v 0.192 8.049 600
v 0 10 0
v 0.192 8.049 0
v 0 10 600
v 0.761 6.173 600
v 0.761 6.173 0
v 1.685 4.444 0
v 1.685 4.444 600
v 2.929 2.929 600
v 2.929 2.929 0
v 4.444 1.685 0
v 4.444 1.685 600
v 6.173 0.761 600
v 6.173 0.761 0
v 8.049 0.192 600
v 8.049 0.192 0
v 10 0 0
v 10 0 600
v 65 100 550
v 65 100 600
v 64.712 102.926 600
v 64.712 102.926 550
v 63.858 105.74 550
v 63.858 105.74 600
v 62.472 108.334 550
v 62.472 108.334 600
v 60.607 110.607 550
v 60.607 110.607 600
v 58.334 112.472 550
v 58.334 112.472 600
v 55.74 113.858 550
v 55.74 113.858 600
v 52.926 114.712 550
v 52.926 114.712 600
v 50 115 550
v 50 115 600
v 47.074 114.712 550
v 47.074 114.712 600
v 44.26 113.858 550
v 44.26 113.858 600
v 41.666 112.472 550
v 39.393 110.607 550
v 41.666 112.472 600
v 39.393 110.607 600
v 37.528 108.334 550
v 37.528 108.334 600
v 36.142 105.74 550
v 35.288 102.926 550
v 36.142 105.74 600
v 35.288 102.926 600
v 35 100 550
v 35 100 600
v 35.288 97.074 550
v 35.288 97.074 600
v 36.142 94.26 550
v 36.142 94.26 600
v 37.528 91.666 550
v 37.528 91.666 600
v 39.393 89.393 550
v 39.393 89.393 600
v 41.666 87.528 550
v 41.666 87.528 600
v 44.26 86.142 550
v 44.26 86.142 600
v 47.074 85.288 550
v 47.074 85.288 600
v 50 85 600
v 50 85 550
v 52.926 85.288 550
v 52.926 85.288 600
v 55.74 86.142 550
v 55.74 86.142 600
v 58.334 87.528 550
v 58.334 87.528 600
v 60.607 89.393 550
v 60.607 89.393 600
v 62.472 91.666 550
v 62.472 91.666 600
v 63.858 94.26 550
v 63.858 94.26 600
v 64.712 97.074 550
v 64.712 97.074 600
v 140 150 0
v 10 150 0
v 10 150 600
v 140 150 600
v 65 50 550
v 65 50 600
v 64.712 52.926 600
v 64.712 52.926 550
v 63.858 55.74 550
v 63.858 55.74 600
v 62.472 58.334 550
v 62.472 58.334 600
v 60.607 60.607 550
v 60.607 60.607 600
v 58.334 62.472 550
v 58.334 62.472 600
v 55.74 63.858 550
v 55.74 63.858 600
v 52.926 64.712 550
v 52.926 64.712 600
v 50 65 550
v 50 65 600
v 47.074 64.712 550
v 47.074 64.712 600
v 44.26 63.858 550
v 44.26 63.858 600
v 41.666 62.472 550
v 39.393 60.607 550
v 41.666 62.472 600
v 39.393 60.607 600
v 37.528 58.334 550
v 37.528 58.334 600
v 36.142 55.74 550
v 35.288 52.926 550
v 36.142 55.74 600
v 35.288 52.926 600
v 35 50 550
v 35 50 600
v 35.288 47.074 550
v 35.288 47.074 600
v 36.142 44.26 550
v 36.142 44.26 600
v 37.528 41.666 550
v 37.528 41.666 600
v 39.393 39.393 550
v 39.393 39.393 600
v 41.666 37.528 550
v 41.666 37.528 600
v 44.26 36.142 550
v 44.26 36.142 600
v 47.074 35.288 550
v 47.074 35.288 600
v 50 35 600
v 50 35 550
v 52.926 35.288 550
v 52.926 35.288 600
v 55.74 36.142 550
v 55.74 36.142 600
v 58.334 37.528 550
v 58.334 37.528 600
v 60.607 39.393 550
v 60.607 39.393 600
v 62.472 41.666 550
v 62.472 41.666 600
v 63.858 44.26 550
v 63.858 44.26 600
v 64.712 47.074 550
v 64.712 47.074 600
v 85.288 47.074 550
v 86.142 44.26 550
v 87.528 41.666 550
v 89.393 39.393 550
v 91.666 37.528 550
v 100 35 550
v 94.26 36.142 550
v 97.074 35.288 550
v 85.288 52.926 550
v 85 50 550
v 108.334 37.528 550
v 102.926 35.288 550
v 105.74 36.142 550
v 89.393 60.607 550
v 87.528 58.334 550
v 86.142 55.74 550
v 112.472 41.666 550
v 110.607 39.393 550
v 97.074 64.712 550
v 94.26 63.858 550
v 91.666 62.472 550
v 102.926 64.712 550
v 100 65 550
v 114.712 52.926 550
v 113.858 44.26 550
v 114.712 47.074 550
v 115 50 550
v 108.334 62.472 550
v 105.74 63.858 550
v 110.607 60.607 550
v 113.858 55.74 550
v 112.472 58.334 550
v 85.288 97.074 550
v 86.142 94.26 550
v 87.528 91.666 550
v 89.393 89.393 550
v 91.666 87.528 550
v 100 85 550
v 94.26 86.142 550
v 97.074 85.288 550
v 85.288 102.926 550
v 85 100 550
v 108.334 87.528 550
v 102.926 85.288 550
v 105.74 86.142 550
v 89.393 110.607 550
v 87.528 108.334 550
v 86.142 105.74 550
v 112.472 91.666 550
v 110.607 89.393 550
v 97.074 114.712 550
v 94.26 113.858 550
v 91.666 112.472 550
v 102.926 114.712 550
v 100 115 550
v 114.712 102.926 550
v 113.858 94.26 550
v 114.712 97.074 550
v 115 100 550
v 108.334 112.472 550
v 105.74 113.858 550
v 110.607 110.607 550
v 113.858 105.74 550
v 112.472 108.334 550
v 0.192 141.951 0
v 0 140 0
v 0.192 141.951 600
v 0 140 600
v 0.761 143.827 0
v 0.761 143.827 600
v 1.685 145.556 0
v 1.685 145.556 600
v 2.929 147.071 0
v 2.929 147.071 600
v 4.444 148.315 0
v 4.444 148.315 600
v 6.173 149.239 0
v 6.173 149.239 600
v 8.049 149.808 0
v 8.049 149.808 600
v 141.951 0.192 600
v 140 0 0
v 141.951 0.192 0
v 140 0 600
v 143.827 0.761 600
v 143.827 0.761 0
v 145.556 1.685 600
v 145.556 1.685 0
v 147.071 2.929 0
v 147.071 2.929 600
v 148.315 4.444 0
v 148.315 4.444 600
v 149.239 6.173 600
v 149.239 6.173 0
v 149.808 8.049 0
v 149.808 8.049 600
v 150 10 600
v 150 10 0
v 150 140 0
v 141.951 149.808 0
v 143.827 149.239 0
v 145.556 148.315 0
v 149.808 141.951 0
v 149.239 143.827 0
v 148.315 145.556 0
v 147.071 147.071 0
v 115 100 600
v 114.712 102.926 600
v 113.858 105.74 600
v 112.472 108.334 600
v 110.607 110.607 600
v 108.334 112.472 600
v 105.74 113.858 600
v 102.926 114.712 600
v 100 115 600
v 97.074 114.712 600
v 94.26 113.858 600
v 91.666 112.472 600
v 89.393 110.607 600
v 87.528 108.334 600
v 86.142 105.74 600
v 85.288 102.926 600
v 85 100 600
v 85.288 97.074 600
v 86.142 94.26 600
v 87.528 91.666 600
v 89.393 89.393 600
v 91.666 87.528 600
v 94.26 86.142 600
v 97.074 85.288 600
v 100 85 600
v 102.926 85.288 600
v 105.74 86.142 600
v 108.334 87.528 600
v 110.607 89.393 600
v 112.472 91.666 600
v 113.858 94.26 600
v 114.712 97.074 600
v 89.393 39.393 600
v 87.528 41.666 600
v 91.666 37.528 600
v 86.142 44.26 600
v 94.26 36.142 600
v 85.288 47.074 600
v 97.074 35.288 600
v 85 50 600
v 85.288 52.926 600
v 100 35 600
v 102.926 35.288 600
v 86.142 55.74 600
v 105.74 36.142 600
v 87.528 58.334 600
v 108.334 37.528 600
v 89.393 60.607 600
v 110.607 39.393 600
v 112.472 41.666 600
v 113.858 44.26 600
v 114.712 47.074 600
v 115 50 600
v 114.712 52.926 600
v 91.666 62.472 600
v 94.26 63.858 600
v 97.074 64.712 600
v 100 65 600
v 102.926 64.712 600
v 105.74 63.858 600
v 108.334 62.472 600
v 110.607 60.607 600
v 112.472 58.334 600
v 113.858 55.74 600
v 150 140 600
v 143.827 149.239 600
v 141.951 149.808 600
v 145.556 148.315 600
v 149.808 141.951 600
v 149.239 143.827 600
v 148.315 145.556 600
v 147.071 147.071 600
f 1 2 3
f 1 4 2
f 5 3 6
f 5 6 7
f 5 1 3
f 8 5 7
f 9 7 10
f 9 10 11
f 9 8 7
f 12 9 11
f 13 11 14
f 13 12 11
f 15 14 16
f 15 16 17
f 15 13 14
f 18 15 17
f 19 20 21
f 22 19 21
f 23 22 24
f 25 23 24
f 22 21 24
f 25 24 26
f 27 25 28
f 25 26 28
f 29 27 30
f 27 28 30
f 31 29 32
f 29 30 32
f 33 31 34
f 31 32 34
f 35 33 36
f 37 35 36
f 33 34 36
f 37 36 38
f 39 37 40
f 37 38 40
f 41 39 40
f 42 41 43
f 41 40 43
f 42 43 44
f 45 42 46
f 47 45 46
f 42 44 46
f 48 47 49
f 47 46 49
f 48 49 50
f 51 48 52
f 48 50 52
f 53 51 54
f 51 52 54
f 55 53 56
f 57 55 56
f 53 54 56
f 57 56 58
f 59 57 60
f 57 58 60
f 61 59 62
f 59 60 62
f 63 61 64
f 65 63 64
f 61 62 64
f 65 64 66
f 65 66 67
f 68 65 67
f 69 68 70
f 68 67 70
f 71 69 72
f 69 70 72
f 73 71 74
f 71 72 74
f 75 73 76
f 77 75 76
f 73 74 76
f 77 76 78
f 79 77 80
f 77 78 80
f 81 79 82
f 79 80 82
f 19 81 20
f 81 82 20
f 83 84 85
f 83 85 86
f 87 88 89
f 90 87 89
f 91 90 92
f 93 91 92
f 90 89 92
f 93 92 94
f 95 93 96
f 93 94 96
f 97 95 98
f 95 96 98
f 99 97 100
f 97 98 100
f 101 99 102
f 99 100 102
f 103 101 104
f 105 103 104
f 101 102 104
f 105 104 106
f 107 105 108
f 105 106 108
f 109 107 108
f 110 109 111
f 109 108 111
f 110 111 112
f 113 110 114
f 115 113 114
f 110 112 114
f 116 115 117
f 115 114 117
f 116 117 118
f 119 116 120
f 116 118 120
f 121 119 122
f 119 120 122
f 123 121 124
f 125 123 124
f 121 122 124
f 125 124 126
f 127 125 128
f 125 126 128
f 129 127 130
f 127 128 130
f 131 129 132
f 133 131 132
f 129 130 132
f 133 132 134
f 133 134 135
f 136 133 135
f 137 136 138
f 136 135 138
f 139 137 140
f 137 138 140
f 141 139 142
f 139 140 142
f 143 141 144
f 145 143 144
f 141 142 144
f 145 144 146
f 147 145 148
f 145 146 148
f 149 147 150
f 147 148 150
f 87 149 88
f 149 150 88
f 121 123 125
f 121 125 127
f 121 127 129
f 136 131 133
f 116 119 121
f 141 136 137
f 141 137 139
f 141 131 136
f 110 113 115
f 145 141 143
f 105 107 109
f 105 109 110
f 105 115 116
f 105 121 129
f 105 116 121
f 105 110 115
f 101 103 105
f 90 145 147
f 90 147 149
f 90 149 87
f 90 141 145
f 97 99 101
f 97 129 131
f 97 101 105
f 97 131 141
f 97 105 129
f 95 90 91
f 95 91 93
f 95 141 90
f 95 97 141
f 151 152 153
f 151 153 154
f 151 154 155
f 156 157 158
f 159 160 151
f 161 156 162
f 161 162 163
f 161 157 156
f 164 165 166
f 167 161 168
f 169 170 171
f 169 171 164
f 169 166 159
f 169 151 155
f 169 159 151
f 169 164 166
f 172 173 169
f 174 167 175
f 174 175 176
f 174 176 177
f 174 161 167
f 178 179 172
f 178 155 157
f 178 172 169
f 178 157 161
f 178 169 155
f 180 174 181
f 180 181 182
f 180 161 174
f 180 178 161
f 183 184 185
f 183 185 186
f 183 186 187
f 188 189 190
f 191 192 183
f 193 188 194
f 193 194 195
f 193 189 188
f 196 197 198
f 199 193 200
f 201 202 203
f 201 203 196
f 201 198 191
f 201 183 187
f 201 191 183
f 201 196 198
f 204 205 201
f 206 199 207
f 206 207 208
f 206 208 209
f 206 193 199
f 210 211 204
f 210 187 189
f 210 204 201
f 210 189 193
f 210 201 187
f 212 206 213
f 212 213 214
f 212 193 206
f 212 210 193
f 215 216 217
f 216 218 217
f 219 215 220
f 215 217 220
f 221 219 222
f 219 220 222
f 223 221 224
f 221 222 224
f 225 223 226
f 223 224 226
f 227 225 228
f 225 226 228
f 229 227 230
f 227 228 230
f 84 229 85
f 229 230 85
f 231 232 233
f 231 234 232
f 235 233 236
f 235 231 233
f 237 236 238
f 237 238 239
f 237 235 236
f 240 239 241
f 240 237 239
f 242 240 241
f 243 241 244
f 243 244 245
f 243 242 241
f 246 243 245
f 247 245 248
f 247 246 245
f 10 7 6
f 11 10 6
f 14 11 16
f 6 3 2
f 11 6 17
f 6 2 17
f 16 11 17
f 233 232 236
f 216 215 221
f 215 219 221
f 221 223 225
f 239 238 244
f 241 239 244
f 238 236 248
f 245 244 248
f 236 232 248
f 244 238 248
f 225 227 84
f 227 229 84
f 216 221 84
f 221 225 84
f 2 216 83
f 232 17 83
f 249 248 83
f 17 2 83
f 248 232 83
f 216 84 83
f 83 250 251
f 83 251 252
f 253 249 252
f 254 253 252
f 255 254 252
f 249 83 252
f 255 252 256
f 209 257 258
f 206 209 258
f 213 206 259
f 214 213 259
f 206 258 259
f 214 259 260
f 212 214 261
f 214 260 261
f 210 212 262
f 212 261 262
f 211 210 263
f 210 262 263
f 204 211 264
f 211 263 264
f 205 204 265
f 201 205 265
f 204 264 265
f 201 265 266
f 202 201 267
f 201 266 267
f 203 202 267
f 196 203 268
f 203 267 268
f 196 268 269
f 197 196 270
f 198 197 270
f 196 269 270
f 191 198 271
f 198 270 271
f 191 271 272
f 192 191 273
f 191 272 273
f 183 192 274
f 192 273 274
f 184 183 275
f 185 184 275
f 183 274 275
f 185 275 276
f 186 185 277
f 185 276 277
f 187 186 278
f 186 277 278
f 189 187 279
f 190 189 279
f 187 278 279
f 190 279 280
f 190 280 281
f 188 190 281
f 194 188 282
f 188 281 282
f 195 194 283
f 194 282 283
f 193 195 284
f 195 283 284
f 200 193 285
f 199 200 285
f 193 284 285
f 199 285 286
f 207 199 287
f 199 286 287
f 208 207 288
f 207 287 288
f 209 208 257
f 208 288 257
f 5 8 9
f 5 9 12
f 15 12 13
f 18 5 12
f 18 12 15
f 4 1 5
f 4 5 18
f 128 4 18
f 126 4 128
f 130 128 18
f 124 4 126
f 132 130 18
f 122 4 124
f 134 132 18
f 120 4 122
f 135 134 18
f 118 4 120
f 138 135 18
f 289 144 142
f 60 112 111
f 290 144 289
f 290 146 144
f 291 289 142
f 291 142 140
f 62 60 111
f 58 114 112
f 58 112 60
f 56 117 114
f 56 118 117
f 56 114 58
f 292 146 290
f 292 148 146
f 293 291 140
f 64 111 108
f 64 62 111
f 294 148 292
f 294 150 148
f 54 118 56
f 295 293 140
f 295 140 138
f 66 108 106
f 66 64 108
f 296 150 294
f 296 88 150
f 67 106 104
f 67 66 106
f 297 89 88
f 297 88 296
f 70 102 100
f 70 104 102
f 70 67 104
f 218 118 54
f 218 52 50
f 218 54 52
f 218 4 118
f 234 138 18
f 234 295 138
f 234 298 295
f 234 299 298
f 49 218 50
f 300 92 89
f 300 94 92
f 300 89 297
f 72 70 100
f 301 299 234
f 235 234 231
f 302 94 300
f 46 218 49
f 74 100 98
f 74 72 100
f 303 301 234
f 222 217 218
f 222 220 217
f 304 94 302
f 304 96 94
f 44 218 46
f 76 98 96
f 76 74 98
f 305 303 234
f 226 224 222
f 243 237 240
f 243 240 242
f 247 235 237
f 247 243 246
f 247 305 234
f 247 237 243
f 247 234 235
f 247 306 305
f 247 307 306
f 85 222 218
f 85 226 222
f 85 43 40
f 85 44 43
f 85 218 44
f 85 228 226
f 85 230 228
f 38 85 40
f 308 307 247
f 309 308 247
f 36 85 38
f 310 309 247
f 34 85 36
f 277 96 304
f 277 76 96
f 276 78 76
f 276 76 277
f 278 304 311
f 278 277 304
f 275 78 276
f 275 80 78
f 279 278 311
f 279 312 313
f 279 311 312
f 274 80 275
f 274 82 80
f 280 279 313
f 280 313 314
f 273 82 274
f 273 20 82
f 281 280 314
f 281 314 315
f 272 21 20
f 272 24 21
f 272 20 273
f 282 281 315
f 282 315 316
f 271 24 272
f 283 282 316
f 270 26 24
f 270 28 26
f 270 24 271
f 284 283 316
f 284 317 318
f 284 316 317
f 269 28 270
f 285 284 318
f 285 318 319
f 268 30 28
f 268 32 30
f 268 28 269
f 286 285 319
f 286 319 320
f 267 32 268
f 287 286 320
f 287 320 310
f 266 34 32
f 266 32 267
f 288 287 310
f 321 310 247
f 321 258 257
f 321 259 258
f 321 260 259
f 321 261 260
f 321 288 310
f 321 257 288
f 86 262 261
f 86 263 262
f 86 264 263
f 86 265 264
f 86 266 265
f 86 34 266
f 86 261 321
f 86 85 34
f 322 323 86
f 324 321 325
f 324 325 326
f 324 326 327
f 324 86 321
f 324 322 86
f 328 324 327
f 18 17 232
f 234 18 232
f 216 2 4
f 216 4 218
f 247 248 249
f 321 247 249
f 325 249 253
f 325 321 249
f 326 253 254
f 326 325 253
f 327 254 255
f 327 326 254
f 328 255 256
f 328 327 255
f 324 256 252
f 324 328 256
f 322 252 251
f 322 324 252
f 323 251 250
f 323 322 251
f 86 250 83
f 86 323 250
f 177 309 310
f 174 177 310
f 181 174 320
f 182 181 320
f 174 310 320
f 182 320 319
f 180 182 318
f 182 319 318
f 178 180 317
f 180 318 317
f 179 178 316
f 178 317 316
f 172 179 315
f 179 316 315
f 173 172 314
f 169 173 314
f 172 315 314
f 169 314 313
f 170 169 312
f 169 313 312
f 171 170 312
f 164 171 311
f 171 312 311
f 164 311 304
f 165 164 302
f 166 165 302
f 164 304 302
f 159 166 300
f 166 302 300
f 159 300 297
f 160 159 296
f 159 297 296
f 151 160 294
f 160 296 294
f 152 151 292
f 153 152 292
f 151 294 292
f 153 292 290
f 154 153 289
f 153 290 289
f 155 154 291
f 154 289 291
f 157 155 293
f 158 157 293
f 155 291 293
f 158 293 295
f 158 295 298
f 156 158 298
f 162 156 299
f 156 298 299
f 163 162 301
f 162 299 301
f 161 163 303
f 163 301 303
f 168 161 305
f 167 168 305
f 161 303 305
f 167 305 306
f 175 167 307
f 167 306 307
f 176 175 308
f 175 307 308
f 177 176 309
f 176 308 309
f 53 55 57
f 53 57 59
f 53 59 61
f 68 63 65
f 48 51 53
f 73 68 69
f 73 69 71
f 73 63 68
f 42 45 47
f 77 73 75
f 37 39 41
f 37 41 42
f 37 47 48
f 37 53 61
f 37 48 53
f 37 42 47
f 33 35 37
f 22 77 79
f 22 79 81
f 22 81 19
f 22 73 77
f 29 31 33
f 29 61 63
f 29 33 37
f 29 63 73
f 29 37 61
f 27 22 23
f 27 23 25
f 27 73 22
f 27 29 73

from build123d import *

# Parameters (mm, degrees)
F0_W     = 150
F0_H     = 150
F1_DEPTH = 600
F2_R     = 10
F3_R     = 15
F4_DEPTH = 50


with BuildPart() as f1:
    # F0 (on Top) → F1 (new body)
    with BuildSketch(Plane.XY):
        with Locations((75, 75)):
            Rectangle(F0_W, F0_H)
    extrude(amount=F1_DEPTH)

    # F2
    f2_edges = [f1.edges().sort_by_distance(p)[0] for p in [
        (0, 150, 300),
        (150, 150, 300),
        (150, 0, 300),
        (0, 0, 300),
    ]]
    fillet(f2_edges, radius=F2_R)

    # F3 (on face) → F4 (cut)
    with BuildSketch(Plane.XY.offset(600)):
        with Locations((50, 100)):
            Circle(F3_R)
        with Locations((100, 100)):
            Circle(F3_R)
        with Locations((100, 50)):
            Circle(F3_R)
        with Locations((50, 50)):
            Circle(F3_R)
    extrude(amount=-F4_DEPTH, mode=Mode.SUBTRACT)


solid = f1.part
